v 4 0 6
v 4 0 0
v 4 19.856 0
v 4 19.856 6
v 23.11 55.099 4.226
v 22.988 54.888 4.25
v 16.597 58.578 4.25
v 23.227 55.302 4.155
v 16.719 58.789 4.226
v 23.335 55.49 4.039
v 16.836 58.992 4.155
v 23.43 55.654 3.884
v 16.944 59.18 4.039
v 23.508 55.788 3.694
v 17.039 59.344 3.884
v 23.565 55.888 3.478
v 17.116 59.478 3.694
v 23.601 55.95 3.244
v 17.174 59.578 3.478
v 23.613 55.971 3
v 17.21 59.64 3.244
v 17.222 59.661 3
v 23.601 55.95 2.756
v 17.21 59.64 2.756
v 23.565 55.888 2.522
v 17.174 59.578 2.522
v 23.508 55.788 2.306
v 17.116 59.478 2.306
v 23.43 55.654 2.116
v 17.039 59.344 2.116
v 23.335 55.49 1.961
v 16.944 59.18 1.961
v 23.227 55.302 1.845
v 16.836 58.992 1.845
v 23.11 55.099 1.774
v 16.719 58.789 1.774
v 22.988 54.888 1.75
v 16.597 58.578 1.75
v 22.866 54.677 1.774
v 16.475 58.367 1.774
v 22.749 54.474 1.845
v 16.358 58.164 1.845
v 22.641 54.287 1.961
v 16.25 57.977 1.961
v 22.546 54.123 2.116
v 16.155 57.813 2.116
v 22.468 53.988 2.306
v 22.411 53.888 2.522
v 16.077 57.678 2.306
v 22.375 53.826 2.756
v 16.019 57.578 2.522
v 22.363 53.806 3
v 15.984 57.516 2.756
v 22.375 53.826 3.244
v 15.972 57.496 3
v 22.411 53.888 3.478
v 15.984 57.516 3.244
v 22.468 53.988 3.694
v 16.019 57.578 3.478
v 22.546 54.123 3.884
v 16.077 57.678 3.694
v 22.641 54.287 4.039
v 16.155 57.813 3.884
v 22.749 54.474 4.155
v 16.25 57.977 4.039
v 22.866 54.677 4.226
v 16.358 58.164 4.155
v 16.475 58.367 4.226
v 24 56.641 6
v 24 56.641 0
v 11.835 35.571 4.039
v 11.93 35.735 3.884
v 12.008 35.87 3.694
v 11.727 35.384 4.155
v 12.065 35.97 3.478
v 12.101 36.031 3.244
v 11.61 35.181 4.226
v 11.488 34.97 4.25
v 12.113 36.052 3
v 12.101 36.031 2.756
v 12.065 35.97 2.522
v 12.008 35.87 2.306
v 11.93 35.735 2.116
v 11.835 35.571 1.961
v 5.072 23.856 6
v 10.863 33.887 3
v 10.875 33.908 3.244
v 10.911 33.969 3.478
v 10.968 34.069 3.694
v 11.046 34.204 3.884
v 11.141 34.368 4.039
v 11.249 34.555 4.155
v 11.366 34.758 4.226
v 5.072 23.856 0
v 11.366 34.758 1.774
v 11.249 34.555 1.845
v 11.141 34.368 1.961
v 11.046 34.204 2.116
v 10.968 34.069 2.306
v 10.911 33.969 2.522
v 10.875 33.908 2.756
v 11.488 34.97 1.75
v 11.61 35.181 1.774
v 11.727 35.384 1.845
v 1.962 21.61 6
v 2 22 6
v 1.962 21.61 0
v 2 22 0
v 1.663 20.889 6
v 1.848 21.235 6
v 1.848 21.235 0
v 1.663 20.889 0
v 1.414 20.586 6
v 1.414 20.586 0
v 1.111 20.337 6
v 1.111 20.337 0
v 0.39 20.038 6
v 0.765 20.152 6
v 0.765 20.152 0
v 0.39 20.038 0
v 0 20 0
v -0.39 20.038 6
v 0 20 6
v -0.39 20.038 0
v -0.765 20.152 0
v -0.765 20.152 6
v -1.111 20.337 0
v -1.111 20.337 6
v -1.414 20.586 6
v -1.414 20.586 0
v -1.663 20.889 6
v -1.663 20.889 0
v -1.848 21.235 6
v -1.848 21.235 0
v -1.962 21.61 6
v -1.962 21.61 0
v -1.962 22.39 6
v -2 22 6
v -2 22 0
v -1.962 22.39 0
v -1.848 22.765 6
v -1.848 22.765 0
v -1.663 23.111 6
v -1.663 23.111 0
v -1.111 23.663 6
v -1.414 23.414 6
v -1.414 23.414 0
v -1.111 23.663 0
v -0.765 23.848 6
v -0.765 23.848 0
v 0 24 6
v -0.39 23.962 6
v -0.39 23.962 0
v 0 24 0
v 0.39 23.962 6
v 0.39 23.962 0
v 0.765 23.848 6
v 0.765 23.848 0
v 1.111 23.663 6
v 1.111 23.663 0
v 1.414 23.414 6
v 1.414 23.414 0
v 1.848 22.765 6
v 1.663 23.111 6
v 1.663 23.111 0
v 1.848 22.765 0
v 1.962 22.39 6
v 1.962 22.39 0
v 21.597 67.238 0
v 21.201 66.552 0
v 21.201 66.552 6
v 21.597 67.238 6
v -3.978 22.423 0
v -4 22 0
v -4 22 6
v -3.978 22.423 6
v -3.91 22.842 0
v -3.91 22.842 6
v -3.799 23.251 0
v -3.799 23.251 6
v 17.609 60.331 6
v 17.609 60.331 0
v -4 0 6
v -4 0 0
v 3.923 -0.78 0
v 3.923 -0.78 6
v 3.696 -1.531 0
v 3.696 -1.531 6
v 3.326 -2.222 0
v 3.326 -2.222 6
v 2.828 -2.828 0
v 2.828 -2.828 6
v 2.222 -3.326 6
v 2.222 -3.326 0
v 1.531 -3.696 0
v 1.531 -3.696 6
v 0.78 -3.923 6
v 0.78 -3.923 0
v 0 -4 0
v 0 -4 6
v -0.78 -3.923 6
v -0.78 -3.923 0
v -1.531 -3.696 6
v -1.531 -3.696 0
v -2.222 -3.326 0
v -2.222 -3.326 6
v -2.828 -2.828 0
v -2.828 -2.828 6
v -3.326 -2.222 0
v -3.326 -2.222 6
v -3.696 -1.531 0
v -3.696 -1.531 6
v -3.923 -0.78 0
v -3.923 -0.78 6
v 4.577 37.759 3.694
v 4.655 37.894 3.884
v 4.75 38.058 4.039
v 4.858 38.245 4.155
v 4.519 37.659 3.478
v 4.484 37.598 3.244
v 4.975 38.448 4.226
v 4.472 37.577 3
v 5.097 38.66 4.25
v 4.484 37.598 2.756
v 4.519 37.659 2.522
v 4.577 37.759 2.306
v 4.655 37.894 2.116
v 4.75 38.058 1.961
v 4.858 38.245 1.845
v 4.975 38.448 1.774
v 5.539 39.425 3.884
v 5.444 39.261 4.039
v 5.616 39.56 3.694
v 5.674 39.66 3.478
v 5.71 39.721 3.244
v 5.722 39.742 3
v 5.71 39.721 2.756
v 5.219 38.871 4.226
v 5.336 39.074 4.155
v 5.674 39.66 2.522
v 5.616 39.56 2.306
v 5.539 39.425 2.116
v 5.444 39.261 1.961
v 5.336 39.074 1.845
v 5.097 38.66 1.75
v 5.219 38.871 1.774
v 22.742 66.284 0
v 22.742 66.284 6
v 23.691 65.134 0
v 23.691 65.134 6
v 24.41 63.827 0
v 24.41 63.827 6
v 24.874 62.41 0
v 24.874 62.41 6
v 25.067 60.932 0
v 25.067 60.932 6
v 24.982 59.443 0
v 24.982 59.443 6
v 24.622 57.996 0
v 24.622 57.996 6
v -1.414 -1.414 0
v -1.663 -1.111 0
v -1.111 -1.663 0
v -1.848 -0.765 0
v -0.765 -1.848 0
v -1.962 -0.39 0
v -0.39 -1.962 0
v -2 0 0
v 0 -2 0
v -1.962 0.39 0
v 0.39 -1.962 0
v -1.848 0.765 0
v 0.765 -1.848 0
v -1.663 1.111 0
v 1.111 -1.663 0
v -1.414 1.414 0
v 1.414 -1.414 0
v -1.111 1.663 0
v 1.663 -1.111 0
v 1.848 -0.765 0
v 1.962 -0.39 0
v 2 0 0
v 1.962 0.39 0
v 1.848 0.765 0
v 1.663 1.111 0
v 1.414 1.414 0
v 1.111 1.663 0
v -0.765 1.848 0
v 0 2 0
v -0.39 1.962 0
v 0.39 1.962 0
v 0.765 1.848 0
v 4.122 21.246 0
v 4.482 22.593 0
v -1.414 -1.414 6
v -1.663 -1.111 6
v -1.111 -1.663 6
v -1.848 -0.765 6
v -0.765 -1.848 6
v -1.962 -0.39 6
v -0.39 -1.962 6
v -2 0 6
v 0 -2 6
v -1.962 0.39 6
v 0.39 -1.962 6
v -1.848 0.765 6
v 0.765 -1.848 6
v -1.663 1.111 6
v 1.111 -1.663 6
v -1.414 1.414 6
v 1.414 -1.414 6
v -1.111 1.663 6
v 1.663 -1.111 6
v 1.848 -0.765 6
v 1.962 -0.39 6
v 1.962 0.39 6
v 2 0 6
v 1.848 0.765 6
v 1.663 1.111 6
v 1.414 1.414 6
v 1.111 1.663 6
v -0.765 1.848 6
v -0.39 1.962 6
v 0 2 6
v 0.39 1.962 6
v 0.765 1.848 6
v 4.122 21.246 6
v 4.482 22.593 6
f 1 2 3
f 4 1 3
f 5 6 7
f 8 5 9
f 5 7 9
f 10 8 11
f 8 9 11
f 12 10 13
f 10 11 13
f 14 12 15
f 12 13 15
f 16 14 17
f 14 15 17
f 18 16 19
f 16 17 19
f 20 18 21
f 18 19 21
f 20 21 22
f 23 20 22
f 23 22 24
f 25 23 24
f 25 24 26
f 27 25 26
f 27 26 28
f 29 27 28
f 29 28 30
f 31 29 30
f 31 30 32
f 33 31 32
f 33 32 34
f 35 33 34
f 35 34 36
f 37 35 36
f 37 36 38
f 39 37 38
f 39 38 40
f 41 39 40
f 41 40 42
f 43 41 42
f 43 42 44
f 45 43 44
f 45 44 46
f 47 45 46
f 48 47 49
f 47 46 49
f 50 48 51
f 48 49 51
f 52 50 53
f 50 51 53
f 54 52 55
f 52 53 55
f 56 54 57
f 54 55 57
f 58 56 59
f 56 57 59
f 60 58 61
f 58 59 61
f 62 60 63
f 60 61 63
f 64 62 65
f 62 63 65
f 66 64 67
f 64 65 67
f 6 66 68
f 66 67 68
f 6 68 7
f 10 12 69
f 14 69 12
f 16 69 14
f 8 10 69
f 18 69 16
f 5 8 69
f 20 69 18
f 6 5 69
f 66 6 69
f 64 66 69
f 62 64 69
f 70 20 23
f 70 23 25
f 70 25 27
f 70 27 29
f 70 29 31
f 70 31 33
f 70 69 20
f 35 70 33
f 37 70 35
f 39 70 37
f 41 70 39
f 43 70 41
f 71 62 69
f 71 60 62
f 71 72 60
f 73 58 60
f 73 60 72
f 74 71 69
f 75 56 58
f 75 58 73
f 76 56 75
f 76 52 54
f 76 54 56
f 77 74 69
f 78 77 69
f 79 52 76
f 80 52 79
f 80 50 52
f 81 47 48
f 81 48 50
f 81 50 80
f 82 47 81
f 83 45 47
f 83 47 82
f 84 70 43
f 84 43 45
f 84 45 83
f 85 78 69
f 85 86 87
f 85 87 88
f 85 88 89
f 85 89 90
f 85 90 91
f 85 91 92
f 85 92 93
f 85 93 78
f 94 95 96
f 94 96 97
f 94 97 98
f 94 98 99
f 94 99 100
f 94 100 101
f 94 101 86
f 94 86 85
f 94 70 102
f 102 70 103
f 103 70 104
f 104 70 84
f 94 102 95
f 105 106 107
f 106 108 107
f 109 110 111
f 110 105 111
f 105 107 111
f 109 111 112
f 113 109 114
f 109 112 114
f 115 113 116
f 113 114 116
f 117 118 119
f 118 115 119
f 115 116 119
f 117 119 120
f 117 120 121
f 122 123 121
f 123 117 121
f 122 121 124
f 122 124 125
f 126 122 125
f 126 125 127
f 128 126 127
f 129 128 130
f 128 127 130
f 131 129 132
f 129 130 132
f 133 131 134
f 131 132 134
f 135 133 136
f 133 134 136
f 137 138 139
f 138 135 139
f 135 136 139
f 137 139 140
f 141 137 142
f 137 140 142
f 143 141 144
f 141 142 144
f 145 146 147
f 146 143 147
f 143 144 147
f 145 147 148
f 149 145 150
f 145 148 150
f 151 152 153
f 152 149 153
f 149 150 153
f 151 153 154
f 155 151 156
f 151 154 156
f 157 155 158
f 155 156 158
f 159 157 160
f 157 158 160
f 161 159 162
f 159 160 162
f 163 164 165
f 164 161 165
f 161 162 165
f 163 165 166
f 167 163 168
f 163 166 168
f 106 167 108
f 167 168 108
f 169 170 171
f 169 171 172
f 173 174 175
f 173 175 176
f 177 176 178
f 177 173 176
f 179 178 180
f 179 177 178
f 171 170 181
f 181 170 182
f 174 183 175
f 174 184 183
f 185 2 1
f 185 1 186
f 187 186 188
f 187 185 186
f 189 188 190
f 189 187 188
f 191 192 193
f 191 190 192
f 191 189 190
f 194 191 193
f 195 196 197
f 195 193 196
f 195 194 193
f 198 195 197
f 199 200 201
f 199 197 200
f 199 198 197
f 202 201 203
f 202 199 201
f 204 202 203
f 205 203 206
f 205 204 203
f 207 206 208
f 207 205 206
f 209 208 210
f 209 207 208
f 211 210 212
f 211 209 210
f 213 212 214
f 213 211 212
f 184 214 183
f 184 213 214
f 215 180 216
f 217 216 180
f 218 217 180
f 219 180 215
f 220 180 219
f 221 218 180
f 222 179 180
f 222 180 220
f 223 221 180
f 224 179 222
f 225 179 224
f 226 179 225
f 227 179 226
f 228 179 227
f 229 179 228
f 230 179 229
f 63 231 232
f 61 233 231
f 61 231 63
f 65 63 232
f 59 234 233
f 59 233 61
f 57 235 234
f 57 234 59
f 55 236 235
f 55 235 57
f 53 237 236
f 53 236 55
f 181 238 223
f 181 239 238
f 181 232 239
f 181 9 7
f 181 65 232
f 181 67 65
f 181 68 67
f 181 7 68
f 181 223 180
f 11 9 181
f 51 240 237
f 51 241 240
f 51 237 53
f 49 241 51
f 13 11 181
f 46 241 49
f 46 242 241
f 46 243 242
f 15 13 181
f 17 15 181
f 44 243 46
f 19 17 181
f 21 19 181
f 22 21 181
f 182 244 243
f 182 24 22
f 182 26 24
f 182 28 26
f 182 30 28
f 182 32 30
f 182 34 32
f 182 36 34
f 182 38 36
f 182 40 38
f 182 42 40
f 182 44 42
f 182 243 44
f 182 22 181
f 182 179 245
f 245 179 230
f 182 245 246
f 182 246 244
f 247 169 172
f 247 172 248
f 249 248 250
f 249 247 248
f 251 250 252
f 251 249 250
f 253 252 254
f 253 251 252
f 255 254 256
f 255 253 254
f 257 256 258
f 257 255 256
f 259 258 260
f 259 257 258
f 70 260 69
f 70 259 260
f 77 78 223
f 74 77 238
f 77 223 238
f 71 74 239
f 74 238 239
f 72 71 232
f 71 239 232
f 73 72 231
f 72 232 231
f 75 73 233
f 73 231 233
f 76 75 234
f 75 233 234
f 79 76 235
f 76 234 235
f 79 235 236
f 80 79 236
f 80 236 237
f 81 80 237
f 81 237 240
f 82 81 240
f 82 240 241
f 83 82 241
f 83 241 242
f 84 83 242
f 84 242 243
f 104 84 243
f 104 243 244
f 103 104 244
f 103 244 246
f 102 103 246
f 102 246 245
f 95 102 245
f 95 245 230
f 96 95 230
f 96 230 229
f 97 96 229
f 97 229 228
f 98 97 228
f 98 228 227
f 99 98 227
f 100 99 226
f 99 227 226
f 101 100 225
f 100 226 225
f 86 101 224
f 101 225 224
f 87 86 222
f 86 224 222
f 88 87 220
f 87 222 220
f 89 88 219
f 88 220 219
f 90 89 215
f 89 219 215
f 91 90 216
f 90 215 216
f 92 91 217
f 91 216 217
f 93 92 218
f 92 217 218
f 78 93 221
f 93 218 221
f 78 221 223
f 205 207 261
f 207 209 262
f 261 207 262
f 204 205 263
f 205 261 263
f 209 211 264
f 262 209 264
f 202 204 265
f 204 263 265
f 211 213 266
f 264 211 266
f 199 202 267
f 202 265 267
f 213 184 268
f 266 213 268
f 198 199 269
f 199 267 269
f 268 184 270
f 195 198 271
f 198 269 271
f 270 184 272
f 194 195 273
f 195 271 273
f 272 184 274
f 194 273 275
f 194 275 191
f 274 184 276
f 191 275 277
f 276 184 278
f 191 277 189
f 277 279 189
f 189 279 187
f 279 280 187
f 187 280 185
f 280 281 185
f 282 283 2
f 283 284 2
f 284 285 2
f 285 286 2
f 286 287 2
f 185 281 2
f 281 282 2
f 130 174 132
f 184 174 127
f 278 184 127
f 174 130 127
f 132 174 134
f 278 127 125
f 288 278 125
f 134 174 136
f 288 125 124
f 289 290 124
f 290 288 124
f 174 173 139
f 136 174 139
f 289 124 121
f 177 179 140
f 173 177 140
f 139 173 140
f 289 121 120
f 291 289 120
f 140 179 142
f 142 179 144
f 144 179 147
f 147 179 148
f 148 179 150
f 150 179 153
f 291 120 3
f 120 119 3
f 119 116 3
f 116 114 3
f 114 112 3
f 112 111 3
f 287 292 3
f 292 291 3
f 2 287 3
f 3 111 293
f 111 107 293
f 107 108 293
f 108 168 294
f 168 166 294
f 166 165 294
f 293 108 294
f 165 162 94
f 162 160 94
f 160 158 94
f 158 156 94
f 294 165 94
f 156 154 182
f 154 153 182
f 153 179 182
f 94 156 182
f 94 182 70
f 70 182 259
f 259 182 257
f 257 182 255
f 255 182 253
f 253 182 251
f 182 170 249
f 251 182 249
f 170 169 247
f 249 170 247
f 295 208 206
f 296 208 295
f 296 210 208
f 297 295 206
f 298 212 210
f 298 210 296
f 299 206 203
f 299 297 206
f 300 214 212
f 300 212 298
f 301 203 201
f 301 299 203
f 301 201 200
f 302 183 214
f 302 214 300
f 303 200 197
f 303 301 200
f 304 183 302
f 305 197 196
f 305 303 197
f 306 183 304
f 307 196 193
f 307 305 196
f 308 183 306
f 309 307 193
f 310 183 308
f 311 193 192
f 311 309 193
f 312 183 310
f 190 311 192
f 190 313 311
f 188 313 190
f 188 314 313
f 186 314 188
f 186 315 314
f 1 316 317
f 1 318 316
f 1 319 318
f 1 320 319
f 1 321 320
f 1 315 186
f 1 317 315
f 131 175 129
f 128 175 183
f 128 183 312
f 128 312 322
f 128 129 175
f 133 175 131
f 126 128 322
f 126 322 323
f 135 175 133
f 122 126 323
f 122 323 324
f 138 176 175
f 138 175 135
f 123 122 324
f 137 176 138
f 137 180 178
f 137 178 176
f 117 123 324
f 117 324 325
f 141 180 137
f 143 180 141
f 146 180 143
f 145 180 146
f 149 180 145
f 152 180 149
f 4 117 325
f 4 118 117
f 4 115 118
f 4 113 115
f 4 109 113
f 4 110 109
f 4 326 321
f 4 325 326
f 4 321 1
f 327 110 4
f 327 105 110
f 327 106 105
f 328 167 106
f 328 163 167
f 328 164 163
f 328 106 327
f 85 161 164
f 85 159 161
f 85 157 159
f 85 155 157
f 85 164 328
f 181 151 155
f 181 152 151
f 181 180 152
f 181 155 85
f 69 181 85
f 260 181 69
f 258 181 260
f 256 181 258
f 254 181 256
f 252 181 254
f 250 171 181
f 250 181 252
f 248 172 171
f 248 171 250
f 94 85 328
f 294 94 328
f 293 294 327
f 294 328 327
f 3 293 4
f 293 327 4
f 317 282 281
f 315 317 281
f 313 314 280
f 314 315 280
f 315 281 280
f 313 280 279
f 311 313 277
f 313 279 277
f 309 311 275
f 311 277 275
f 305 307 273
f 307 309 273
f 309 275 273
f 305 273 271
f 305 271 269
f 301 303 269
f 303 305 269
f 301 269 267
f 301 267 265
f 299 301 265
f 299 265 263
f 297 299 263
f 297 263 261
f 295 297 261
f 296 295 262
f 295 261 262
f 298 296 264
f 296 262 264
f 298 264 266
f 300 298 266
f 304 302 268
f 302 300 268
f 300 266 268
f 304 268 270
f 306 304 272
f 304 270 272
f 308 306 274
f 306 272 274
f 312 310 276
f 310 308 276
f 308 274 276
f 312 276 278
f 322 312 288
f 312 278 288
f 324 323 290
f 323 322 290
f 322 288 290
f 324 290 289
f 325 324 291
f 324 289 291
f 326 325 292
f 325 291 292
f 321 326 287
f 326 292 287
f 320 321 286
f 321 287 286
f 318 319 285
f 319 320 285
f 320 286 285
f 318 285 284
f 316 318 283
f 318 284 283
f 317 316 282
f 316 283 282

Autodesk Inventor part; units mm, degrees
ref_plane "YZ Plane" through (0, 0, 0) normal (1, 0, 0) x (0, 1, 0)
ref_plane "XZ Plane" through (0, 0, 0) normal (0, 1, 0) x (-1, 0, 0)
ref_plane "XY Plane" through (0, 0, 0) normal (0, 0, 1) x (1, 0, 0)
sketch "Sketch1" plane through (0, 0, 0) normal (0, 0, 1) x (1, 0, 0)
  circle A0 centre (0, 0) radius 2
  arc A1 (-4, 0) -> (4, 0) centre (0, 0) ccw
  line L0 (0, 0) -> (0, 22) construction
  circle A2 centre (0, 22) radius 2
  arc A3 (-3.7993, 23.2511) -> (-4, 22) centre (0, 22) ccw
  line L1 (0, 22) -> (25, 65.3013) construction
  circle A4 centre (25, 65.3013) radius 2
  arc A5 (27, 61.8372) -> (21.2007, 66.5524) centre (25, 65.3013) ccw
  line L2 (-4, 0) -> (-4, 22)
  line L3 (4, 0) -> (4, 22)
  line L4 (-3.7993, 23.2511) -> (17.6088, 60.331)
  line L5 (24, 56.641) -> (4, 22)
  line L6 (30.6468, 62.0411) -> (28.537, 63.2592)
  line L7 (27, 61.8372) -> (28, 63.5692)
  line L8 (21.2007, 66.5524) -> (17.6088, 60.331)
  line L9 (21.0718, 67.5692) -> (19.4047, 68.5317)
  line L10 (21.2007, 66.5524) -> (21.6088, 67.2592)
  arc A6 (24, 56.641) -> (21.0718, 67.5692) centre (17.0718, 60.641) ccw
  line L11 (27, 61.8372) -> (24, 56.641)
  point P0 (21.5269, 67.2857)
  point P1 (21.5967, 67.2384)
  dimension "d0" = 4
  dimension "d1" = 8
  dimension "d2" = 22
  dimension "d3" = 4
  dimension "d4" = 8
  dimension "d5" = 50
  dimension "d6" = 150
  dimension "d7" = 4
  dimension "d8" = 8
  dimension "d13" = 8
extrude "Extrusion1" add sketch "Sketch1" along normal blind 6 contours L2 A3 L4 L8 L10 A6 A4 L5 L3 A1 | A4 A6 picked at (23.7732, 64.4877)
fillet "Fillet1" radius 8 1 edges at (4, 22, 3)
sketch "Sketch2" plane through (-3.7993, 23.2511, 0) normal (-0.866, 0.5, 0) x (0, 0, 1)
  line L0 (0, 42.8162) -> (6, 42.8162) projected
  circle A0 centre (3, 17.7921) radius 1.25
  circle A1 centre (3, 40.7921) radius 1.25
  line L1 (0, 50.7921) -> (6, 50.7921) projected
  line L2 (0, 0) -> (6, 0) projected
  line L3 (-2.4062, 7.7921) -> (9.3174, 7.7921)
  point P0 (0, -18.2364)
  dimension "d15" = 2.5
  dimension "d16" = 2.5
  dimension "d17" = 10
  dimension "d19" = 43
  dimension "d20" = 10
extrude "Extrusion2" cut sketch "Sketch2" against normal blind 10
properties part number "Gripper 5-2"
